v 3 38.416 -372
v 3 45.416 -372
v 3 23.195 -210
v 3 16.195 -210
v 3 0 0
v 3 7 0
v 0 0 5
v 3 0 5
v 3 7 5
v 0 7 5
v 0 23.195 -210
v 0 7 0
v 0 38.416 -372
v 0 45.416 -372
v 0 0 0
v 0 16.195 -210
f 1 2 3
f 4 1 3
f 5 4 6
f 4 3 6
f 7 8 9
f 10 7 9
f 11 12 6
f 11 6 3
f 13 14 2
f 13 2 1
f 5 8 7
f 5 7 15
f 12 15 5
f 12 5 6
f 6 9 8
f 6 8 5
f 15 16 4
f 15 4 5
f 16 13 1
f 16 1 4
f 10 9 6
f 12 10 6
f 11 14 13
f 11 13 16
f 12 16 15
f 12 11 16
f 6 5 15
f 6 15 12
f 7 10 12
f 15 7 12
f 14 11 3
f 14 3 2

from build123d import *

# Parameters (mm, degrees)
BOSS_EXTRUDE1_DEPTH = 3
SKETCH2_W           = 5
SKETCH2_H           = 7
BOSS_EXTRUDE2_DEPTH = 3


with BuildPart() as part:
    # Sketch1 → Boss-Extrude1 (new body)
    with BuildSketch(Plane(origin=(0, 0, 0), x_dir=(0, 0, -1), z_dir=(1, 0, 0))):
        Polygon((0, 0), (0, 7), (210, 23.195488775), (372, 45.41553397), (372, 38.41553397), (210, 16.195488775), align=None)
    extrude(amount=BOSS_EXTRUDE1_DEPTH)


with BuildPart() as body_2:
    # Sketch2 → Boss-Extrude2 (new body)
    with BuildSketch(Plane(origin=(3, 0, 0), x_dir=(0, 0, -1), z_dir=(1, 0, 0))):
        with Locations((-2.5, 3.5)):
            Rectangle(SKETCH2_W, SKETCH2_H)
    extrude(amount=-BOSS_EXTRUDE2_DEPTH)


solid = Compound([part.part, body_2.part])
